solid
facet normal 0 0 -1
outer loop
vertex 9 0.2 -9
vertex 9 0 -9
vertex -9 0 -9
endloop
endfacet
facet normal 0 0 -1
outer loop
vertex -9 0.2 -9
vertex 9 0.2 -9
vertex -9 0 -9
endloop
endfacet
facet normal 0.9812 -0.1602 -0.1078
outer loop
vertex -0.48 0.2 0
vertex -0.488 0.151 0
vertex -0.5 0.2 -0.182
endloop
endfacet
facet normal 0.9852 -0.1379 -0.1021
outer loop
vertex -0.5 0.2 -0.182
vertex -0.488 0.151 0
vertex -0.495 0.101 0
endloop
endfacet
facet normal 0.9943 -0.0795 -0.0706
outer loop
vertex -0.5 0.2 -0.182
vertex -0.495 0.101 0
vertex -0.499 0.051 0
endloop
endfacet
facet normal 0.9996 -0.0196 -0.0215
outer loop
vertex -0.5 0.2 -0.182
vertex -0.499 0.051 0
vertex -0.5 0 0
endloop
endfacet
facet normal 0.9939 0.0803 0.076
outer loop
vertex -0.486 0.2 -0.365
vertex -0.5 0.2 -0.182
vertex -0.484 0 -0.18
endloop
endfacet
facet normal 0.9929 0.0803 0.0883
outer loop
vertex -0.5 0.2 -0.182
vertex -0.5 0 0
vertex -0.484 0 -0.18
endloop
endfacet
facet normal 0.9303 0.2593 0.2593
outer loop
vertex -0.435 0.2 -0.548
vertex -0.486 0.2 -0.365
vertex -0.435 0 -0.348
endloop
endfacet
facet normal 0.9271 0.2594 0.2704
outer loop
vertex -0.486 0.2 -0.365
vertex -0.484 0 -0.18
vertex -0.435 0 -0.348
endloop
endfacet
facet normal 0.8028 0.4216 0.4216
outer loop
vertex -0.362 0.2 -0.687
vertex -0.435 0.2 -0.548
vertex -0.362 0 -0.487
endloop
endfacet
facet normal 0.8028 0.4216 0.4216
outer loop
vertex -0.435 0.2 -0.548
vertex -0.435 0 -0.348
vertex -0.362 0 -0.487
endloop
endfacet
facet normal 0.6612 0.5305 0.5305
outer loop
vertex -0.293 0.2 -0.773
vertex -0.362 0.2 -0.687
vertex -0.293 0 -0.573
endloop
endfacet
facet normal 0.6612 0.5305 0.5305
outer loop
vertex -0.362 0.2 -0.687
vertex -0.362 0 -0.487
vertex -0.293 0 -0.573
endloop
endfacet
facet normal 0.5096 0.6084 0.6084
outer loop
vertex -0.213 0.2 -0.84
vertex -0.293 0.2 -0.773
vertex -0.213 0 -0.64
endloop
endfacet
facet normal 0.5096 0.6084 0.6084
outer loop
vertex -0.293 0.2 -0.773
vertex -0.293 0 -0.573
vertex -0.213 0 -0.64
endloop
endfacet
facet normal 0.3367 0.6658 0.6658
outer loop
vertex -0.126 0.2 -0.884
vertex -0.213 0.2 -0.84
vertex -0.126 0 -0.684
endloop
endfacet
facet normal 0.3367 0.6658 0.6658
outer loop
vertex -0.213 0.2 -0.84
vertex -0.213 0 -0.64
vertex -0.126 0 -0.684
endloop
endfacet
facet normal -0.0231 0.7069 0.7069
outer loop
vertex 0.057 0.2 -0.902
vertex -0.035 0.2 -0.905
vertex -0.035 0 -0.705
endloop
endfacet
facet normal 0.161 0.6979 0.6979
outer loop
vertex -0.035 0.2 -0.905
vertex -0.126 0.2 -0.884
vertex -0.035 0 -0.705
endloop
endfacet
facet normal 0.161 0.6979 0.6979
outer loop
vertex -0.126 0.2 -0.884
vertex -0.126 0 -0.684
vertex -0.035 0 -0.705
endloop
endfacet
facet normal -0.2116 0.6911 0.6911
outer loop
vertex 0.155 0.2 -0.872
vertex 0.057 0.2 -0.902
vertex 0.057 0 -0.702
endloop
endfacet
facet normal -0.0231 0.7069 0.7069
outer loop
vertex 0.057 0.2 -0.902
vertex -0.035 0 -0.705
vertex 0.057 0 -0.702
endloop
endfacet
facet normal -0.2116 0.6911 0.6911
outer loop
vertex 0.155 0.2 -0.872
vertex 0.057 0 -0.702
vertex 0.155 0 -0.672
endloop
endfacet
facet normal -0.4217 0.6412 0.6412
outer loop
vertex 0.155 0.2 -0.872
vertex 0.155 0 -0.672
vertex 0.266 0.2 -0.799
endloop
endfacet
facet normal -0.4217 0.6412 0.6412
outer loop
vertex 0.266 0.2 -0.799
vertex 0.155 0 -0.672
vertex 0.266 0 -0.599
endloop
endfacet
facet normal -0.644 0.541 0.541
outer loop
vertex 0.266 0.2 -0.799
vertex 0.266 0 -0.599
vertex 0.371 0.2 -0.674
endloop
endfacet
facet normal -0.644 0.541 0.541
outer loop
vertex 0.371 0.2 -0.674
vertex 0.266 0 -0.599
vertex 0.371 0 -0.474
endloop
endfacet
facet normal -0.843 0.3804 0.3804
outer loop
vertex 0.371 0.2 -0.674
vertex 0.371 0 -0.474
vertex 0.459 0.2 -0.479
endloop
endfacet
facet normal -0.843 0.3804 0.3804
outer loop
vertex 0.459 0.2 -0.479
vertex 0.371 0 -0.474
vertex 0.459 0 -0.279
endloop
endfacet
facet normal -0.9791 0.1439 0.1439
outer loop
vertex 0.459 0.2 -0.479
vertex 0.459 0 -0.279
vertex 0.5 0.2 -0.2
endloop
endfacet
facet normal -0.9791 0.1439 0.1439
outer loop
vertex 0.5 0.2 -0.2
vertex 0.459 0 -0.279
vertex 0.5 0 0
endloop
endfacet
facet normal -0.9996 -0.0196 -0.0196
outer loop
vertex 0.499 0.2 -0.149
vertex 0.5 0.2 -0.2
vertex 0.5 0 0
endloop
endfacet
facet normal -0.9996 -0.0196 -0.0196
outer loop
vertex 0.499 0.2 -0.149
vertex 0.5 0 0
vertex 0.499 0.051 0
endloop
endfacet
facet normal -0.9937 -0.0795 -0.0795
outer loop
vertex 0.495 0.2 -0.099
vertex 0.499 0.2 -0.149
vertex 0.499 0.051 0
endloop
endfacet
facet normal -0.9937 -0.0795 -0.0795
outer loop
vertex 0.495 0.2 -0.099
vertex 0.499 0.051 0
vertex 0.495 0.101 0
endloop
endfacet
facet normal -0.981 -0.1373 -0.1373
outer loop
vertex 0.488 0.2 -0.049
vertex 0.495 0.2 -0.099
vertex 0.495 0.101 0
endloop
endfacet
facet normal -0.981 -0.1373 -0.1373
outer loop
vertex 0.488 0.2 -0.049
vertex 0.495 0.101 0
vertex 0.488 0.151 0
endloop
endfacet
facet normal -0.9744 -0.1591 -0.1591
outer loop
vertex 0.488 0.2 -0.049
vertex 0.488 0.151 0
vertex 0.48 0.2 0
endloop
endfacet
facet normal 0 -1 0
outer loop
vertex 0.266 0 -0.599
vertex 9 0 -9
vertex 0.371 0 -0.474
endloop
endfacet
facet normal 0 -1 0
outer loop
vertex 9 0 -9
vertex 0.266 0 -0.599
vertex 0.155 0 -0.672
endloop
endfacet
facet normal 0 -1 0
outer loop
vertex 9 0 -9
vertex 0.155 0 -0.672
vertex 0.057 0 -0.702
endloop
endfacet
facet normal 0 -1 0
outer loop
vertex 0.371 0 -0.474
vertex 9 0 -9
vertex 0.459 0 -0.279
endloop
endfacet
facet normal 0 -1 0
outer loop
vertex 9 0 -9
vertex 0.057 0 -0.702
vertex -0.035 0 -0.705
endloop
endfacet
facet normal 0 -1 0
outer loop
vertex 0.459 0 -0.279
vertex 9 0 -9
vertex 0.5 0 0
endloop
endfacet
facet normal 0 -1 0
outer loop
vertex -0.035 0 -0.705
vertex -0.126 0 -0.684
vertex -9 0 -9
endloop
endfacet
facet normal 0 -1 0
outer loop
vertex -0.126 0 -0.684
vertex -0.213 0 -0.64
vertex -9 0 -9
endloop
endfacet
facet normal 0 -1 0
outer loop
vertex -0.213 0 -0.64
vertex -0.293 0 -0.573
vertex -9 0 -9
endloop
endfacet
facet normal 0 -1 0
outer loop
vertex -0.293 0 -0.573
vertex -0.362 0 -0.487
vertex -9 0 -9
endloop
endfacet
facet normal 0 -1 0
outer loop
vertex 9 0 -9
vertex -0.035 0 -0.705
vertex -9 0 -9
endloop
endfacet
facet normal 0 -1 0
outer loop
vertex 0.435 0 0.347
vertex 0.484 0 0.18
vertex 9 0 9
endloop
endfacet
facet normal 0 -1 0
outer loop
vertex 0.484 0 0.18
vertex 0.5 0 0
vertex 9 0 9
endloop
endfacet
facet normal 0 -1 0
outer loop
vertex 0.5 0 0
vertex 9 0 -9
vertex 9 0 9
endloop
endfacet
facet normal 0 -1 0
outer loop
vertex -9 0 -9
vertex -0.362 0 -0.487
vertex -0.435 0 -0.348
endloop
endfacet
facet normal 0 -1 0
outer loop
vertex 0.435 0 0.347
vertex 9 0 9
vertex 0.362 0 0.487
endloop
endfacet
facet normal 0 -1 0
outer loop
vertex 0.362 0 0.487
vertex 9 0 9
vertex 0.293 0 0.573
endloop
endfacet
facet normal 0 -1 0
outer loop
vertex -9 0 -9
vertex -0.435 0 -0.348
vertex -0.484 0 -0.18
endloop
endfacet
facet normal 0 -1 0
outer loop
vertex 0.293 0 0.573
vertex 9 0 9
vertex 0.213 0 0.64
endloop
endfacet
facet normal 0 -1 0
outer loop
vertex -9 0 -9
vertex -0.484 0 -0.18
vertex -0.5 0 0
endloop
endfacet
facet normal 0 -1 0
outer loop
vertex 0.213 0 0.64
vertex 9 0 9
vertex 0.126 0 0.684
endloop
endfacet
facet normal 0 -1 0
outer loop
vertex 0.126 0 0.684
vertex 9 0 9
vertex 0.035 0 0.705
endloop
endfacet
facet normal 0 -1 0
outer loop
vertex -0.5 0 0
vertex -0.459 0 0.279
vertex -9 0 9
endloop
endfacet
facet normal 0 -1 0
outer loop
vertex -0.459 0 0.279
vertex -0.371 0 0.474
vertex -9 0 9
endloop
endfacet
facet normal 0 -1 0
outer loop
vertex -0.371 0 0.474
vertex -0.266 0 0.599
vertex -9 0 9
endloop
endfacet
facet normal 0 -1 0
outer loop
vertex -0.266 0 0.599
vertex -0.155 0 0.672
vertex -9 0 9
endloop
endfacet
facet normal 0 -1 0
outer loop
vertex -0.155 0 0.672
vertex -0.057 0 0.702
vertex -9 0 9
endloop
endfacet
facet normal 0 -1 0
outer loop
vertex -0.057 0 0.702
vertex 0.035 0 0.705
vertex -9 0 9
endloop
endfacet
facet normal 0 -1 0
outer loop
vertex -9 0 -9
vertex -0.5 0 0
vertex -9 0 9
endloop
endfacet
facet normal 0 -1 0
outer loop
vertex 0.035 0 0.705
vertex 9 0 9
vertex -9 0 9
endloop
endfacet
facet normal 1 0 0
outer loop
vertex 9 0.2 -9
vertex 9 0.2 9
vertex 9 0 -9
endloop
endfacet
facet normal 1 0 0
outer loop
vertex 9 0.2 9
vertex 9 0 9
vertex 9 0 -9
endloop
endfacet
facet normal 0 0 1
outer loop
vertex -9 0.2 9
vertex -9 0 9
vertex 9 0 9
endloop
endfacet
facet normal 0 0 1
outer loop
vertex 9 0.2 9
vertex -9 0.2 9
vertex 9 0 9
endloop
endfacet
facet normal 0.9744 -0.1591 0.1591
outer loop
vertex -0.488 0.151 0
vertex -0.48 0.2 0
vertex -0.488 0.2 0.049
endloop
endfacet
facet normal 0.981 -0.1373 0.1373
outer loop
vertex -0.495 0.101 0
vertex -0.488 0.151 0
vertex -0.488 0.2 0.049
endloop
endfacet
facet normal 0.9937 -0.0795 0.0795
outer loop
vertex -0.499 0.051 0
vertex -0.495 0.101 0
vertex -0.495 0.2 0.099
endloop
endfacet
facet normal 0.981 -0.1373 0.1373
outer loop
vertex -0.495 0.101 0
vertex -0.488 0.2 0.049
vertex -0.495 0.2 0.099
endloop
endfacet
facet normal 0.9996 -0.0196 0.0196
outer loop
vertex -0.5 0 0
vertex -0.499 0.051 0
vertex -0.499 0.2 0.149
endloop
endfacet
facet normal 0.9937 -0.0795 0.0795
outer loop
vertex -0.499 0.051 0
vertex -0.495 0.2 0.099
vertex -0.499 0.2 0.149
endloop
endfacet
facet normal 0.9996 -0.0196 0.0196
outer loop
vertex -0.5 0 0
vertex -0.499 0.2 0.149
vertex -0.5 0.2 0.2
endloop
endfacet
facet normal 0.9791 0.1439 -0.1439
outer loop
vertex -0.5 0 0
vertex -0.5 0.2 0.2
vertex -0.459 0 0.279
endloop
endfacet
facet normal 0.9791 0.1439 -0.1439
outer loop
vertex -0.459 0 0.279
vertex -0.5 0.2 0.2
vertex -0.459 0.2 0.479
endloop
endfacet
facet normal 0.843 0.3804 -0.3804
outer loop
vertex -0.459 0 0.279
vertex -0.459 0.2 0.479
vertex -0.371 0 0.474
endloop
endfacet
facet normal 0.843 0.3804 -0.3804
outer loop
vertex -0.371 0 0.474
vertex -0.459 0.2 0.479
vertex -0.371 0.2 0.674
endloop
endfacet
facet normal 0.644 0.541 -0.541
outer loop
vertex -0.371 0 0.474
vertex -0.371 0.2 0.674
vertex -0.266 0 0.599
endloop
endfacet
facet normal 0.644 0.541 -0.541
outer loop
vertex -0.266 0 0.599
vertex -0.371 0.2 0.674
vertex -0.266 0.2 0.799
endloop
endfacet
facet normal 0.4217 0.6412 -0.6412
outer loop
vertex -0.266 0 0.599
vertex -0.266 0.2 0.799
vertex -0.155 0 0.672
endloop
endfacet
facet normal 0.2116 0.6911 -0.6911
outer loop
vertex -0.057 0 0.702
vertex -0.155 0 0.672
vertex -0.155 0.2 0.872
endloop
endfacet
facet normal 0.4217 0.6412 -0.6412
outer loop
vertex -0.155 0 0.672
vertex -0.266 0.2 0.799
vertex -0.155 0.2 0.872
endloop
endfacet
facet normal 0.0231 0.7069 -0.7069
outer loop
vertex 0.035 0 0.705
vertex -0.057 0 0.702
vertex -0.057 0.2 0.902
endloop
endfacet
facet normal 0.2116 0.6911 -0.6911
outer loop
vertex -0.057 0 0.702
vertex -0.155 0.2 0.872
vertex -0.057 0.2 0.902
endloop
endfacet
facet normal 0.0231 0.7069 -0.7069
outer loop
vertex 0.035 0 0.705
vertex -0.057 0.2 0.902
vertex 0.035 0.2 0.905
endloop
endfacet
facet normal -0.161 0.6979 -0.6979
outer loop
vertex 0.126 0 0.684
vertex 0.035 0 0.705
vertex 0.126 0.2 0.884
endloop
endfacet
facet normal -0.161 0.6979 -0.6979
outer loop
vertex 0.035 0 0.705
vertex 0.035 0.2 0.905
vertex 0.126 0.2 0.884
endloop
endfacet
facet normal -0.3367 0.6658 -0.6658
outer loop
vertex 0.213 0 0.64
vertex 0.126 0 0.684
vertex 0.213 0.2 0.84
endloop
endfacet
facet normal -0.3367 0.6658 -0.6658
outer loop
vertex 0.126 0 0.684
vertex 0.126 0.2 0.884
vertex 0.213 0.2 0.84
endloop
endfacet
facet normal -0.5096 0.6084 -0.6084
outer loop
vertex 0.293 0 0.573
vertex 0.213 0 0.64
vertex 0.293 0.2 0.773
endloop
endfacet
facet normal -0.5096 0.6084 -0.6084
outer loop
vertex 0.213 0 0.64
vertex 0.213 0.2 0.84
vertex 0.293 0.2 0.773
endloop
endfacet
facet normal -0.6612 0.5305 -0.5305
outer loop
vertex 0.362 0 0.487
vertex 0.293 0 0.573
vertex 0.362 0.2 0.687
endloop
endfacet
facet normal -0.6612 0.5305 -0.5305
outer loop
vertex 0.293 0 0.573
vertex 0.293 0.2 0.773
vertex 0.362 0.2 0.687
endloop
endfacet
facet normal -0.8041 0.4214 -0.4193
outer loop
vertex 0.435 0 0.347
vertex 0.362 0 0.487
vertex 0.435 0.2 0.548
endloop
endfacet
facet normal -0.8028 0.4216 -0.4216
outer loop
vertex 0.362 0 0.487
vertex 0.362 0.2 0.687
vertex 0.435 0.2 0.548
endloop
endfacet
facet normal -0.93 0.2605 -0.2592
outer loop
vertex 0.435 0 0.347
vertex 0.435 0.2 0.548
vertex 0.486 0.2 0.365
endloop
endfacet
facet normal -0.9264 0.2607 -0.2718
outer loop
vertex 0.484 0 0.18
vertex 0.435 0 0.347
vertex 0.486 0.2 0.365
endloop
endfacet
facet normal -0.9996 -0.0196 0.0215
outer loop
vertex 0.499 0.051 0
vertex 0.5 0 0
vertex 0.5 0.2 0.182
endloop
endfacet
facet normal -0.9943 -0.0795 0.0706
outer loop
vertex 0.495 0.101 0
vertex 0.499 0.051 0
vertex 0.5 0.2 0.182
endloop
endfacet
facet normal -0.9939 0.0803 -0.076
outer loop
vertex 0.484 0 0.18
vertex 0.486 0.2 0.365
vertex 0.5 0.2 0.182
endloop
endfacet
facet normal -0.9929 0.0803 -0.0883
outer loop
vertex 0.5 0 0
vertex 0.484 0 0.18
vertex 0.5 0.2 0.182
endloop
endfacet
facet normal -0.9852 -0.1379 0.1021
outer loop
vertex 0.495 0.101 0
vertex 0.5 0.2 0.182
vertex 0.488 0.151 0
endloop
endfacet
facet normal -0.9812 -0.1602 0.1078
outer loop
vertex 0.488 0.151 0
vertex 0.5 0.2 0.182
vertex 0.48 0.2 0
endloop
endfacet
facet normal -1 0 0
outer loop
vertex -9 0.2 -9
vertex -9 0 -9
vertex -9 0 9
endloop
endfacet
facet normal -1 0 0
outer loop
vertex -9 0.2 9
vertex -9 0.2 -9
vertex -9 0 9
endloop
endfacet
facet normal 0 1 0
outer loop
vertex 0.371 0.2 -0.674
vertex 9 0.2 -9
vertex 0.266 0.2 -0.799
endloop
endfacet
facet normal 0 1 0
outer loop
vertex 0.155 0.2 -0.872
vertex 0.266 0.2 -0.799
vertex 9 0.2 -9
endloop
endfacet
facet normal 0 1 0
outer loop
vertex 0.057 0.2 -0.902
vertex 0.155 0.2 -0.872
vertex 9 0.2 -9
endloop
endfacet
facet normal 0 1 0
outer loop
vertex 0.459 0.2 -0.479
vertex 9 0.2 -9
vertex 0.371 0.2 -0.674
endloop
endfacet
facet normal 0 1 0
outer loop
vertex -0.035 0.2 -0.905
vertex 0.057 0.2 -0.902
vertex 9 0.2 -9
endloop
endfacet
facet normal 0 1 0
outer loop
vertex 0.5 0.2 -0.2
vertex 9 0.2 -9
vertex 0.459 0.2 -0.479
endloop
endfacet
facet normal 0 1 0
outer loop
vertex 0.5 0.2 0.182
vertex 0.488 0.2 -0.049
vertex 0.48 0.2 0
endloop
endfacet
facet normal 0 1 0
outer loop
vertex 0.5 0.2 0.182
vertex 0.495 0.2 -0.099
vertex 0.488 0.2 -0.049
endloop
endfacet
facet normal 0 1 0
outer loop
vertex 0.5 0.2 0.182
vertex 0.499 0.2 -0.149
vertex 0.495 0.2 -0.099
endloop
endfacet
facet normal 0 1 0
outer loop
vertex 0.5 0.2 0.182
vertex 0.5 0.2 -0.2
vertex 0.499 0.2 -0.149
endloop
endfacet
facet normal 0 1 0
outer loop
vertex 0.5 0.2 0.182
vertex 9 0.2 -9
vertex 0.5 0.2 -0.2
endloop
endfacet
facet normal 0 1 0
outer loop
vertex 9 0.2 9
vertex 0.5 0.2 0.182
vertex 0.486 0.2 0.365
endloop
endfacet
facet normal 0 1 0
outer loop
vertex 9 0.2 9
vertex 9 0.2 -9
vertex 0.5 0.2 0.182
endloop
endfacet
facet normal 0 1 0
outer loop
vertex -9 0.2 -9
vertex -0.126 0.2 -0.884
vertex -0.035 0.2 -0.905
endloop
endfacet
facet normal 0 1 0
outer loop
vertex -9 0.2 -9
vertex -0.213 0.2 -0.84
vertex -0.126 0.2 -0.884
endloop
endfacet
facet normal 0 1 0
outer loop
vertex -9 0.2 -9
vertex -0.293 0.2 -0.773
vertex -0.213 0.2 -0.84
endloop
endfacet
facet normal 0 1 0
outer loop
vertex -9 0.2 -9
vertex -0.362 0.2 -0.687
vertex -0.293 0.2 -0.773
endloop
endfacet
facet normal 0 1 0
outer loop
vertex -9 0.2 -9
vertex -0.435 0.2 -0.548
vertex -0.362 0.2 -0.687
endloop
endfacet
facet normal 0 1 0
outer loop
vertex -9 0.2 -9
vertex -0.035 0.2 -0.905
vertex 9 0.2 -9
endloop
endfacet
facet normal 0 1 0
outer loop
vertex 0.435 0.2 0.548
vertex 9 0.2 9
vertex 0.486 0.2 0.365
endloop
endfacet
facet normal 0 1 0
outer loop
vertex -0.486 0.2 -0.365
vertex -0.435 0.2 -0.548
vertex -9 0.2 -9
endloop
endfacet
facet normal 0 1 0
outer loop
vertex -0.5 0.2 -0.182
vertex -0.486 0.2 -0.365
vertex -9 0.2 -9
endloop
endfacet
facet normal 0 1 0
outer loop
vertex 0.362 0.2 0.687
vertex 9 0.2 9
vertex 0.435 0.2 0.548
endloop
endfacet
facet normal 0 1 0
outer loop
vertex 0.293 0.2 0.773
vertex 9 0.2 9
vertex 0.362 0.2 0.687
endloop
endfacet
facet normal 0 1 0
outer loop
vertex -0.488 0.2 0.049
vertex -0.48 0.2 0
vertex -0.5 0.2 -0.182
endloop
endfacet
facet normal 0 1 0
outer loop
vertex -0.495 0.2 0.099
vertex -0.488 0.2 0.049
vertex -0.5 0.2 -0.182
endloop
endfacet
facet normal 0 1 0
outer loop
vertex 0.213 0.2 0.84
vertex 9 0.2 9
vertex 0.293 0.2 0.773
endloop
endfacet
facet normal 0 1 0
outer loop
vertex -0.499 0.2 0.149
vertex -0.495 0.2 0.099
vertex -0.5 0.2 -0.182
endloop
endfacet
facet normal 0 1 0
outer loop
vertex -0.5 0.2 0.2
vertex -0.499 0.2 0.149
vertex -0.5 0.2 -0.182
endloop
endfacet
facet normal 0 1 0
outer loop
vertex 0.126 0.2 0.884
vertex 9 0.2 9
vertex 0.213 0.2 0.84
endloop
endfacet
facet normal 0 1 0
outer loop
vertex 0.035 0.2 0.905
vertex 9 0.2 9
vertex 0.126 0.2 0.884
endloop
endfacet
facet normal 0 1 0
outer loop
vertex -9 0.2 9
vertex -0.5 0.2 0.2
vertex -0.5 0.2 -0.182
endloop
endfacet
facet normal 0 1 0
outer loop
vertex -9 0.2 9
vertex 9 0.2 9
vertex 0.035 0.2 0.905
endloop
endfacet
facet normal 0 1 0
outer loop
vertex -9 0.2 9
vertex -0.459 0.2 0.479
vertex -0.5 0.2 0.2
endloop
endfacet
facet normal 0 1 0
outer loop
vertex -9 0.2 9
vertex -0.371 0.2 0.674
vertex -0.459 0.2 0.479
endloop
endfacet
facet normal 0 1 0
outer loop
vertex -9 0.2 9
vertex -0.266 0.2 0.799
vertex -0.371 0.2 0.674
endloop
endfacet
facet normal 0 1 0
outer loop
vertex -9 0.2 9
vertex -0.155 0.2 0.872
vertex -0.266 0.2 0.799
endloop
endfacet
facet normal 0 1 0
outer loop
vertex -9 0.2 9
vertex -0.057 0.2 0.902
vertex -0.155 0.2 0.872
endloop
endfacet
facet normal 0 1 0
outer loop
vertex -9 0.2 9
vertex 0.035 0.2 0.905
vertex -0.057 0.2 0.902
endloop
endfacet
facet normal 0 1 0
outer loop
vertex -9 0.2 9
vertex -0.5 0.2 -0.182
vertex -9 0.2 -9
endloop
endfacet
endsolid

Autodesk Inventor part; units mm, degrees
ref_plane "YZ Plane" through (0, 0, 0) normal (1, 0, 0) x (0, 1, 0)
ref_plane "XZ Plane" through (0, 0, 0) normal (0, 1, 0) x (-1, 0, 0)
ref_plane "XY Plane" through (0, 0, 0) normal (0, 0, 1) x (1, 0, 0)
sketch "Sketch1" plane through (0, 0, 0) normal (0, 1, 0) x (-1, 0, 0)
  line L0 (-9, -9) -> (9, -9)
  line L1 (9, -9) -> (9, 9)
  line L2 (9, 9) -> (-9, 9)
  line L3 (-9, 9) -> (-9, -9)
  line L4 (-9, -9) -> (9, 9) construction
  line L5 (9, -9) -> (-9, 9) construction
  point P0 (0, 0)
  dimension "d0" = 18
  dimension "d1" = 18
extrude "Extrusion1" add sketch "Sketch1" along normal blind 0.2
ref_plane "Work Plane1" through (-9, 0.2, 9) normal (0, -0.7071, 0.7071) x (1, 0, 0)
sketch "Sketch2" plane through (-9, 0.2, 9) normal (0, -0.7071, 0.7071) x (1, 0, 0)
  line L0 (18, -12.8693) -> (0, -12.8693) projected
  line L1 (18, -0.1414) -> (18, -12.8693) projected
  line L2 (0, -0.1414) -> (18, -0.1414) projected
  line L3 (0, -12.8693) -> (0, -0.1414) projected
  circle A0 centre (9, -6.5054) radius 0.5
  dimension "d4" = 1
extrude "Extrusion2" cut sketch "Sketch2" against normal through all contours A0
ref_plane "Work Plane2" through (-9, 0.2, 9) normal (0, 0.7071, 0.7071) x (-1, 0, 0)
sketch "Sketch3" plane through (-9, 0.2, 9) normal (0, 0.7071, 0.7071) x (-1, 0, 0)
  circle A0 centre (-9, -6.5054) radius 0.5 projected
  line L0 (-18, -12.7279) -> (0, -12.7279) projected
  line L1 (0, -12.7279) -> (0, 0) projected
  line L2 (0, 0) -> (-18, 0) projected
  line L3 (-18, 0) -> (-18, -12.7279) projected
  circle A1 centre (-9, -6.2225) radius 0.5
  dimension "d7" = 1
extrude "Extrusion3" cut sketch "Sketch3" against normal through all contours A1 A0 | A0 A1 picked at (-9.0194, -6.2456) picked at (-9.0263, -5.8205)
properties part number "00_coverslip"
